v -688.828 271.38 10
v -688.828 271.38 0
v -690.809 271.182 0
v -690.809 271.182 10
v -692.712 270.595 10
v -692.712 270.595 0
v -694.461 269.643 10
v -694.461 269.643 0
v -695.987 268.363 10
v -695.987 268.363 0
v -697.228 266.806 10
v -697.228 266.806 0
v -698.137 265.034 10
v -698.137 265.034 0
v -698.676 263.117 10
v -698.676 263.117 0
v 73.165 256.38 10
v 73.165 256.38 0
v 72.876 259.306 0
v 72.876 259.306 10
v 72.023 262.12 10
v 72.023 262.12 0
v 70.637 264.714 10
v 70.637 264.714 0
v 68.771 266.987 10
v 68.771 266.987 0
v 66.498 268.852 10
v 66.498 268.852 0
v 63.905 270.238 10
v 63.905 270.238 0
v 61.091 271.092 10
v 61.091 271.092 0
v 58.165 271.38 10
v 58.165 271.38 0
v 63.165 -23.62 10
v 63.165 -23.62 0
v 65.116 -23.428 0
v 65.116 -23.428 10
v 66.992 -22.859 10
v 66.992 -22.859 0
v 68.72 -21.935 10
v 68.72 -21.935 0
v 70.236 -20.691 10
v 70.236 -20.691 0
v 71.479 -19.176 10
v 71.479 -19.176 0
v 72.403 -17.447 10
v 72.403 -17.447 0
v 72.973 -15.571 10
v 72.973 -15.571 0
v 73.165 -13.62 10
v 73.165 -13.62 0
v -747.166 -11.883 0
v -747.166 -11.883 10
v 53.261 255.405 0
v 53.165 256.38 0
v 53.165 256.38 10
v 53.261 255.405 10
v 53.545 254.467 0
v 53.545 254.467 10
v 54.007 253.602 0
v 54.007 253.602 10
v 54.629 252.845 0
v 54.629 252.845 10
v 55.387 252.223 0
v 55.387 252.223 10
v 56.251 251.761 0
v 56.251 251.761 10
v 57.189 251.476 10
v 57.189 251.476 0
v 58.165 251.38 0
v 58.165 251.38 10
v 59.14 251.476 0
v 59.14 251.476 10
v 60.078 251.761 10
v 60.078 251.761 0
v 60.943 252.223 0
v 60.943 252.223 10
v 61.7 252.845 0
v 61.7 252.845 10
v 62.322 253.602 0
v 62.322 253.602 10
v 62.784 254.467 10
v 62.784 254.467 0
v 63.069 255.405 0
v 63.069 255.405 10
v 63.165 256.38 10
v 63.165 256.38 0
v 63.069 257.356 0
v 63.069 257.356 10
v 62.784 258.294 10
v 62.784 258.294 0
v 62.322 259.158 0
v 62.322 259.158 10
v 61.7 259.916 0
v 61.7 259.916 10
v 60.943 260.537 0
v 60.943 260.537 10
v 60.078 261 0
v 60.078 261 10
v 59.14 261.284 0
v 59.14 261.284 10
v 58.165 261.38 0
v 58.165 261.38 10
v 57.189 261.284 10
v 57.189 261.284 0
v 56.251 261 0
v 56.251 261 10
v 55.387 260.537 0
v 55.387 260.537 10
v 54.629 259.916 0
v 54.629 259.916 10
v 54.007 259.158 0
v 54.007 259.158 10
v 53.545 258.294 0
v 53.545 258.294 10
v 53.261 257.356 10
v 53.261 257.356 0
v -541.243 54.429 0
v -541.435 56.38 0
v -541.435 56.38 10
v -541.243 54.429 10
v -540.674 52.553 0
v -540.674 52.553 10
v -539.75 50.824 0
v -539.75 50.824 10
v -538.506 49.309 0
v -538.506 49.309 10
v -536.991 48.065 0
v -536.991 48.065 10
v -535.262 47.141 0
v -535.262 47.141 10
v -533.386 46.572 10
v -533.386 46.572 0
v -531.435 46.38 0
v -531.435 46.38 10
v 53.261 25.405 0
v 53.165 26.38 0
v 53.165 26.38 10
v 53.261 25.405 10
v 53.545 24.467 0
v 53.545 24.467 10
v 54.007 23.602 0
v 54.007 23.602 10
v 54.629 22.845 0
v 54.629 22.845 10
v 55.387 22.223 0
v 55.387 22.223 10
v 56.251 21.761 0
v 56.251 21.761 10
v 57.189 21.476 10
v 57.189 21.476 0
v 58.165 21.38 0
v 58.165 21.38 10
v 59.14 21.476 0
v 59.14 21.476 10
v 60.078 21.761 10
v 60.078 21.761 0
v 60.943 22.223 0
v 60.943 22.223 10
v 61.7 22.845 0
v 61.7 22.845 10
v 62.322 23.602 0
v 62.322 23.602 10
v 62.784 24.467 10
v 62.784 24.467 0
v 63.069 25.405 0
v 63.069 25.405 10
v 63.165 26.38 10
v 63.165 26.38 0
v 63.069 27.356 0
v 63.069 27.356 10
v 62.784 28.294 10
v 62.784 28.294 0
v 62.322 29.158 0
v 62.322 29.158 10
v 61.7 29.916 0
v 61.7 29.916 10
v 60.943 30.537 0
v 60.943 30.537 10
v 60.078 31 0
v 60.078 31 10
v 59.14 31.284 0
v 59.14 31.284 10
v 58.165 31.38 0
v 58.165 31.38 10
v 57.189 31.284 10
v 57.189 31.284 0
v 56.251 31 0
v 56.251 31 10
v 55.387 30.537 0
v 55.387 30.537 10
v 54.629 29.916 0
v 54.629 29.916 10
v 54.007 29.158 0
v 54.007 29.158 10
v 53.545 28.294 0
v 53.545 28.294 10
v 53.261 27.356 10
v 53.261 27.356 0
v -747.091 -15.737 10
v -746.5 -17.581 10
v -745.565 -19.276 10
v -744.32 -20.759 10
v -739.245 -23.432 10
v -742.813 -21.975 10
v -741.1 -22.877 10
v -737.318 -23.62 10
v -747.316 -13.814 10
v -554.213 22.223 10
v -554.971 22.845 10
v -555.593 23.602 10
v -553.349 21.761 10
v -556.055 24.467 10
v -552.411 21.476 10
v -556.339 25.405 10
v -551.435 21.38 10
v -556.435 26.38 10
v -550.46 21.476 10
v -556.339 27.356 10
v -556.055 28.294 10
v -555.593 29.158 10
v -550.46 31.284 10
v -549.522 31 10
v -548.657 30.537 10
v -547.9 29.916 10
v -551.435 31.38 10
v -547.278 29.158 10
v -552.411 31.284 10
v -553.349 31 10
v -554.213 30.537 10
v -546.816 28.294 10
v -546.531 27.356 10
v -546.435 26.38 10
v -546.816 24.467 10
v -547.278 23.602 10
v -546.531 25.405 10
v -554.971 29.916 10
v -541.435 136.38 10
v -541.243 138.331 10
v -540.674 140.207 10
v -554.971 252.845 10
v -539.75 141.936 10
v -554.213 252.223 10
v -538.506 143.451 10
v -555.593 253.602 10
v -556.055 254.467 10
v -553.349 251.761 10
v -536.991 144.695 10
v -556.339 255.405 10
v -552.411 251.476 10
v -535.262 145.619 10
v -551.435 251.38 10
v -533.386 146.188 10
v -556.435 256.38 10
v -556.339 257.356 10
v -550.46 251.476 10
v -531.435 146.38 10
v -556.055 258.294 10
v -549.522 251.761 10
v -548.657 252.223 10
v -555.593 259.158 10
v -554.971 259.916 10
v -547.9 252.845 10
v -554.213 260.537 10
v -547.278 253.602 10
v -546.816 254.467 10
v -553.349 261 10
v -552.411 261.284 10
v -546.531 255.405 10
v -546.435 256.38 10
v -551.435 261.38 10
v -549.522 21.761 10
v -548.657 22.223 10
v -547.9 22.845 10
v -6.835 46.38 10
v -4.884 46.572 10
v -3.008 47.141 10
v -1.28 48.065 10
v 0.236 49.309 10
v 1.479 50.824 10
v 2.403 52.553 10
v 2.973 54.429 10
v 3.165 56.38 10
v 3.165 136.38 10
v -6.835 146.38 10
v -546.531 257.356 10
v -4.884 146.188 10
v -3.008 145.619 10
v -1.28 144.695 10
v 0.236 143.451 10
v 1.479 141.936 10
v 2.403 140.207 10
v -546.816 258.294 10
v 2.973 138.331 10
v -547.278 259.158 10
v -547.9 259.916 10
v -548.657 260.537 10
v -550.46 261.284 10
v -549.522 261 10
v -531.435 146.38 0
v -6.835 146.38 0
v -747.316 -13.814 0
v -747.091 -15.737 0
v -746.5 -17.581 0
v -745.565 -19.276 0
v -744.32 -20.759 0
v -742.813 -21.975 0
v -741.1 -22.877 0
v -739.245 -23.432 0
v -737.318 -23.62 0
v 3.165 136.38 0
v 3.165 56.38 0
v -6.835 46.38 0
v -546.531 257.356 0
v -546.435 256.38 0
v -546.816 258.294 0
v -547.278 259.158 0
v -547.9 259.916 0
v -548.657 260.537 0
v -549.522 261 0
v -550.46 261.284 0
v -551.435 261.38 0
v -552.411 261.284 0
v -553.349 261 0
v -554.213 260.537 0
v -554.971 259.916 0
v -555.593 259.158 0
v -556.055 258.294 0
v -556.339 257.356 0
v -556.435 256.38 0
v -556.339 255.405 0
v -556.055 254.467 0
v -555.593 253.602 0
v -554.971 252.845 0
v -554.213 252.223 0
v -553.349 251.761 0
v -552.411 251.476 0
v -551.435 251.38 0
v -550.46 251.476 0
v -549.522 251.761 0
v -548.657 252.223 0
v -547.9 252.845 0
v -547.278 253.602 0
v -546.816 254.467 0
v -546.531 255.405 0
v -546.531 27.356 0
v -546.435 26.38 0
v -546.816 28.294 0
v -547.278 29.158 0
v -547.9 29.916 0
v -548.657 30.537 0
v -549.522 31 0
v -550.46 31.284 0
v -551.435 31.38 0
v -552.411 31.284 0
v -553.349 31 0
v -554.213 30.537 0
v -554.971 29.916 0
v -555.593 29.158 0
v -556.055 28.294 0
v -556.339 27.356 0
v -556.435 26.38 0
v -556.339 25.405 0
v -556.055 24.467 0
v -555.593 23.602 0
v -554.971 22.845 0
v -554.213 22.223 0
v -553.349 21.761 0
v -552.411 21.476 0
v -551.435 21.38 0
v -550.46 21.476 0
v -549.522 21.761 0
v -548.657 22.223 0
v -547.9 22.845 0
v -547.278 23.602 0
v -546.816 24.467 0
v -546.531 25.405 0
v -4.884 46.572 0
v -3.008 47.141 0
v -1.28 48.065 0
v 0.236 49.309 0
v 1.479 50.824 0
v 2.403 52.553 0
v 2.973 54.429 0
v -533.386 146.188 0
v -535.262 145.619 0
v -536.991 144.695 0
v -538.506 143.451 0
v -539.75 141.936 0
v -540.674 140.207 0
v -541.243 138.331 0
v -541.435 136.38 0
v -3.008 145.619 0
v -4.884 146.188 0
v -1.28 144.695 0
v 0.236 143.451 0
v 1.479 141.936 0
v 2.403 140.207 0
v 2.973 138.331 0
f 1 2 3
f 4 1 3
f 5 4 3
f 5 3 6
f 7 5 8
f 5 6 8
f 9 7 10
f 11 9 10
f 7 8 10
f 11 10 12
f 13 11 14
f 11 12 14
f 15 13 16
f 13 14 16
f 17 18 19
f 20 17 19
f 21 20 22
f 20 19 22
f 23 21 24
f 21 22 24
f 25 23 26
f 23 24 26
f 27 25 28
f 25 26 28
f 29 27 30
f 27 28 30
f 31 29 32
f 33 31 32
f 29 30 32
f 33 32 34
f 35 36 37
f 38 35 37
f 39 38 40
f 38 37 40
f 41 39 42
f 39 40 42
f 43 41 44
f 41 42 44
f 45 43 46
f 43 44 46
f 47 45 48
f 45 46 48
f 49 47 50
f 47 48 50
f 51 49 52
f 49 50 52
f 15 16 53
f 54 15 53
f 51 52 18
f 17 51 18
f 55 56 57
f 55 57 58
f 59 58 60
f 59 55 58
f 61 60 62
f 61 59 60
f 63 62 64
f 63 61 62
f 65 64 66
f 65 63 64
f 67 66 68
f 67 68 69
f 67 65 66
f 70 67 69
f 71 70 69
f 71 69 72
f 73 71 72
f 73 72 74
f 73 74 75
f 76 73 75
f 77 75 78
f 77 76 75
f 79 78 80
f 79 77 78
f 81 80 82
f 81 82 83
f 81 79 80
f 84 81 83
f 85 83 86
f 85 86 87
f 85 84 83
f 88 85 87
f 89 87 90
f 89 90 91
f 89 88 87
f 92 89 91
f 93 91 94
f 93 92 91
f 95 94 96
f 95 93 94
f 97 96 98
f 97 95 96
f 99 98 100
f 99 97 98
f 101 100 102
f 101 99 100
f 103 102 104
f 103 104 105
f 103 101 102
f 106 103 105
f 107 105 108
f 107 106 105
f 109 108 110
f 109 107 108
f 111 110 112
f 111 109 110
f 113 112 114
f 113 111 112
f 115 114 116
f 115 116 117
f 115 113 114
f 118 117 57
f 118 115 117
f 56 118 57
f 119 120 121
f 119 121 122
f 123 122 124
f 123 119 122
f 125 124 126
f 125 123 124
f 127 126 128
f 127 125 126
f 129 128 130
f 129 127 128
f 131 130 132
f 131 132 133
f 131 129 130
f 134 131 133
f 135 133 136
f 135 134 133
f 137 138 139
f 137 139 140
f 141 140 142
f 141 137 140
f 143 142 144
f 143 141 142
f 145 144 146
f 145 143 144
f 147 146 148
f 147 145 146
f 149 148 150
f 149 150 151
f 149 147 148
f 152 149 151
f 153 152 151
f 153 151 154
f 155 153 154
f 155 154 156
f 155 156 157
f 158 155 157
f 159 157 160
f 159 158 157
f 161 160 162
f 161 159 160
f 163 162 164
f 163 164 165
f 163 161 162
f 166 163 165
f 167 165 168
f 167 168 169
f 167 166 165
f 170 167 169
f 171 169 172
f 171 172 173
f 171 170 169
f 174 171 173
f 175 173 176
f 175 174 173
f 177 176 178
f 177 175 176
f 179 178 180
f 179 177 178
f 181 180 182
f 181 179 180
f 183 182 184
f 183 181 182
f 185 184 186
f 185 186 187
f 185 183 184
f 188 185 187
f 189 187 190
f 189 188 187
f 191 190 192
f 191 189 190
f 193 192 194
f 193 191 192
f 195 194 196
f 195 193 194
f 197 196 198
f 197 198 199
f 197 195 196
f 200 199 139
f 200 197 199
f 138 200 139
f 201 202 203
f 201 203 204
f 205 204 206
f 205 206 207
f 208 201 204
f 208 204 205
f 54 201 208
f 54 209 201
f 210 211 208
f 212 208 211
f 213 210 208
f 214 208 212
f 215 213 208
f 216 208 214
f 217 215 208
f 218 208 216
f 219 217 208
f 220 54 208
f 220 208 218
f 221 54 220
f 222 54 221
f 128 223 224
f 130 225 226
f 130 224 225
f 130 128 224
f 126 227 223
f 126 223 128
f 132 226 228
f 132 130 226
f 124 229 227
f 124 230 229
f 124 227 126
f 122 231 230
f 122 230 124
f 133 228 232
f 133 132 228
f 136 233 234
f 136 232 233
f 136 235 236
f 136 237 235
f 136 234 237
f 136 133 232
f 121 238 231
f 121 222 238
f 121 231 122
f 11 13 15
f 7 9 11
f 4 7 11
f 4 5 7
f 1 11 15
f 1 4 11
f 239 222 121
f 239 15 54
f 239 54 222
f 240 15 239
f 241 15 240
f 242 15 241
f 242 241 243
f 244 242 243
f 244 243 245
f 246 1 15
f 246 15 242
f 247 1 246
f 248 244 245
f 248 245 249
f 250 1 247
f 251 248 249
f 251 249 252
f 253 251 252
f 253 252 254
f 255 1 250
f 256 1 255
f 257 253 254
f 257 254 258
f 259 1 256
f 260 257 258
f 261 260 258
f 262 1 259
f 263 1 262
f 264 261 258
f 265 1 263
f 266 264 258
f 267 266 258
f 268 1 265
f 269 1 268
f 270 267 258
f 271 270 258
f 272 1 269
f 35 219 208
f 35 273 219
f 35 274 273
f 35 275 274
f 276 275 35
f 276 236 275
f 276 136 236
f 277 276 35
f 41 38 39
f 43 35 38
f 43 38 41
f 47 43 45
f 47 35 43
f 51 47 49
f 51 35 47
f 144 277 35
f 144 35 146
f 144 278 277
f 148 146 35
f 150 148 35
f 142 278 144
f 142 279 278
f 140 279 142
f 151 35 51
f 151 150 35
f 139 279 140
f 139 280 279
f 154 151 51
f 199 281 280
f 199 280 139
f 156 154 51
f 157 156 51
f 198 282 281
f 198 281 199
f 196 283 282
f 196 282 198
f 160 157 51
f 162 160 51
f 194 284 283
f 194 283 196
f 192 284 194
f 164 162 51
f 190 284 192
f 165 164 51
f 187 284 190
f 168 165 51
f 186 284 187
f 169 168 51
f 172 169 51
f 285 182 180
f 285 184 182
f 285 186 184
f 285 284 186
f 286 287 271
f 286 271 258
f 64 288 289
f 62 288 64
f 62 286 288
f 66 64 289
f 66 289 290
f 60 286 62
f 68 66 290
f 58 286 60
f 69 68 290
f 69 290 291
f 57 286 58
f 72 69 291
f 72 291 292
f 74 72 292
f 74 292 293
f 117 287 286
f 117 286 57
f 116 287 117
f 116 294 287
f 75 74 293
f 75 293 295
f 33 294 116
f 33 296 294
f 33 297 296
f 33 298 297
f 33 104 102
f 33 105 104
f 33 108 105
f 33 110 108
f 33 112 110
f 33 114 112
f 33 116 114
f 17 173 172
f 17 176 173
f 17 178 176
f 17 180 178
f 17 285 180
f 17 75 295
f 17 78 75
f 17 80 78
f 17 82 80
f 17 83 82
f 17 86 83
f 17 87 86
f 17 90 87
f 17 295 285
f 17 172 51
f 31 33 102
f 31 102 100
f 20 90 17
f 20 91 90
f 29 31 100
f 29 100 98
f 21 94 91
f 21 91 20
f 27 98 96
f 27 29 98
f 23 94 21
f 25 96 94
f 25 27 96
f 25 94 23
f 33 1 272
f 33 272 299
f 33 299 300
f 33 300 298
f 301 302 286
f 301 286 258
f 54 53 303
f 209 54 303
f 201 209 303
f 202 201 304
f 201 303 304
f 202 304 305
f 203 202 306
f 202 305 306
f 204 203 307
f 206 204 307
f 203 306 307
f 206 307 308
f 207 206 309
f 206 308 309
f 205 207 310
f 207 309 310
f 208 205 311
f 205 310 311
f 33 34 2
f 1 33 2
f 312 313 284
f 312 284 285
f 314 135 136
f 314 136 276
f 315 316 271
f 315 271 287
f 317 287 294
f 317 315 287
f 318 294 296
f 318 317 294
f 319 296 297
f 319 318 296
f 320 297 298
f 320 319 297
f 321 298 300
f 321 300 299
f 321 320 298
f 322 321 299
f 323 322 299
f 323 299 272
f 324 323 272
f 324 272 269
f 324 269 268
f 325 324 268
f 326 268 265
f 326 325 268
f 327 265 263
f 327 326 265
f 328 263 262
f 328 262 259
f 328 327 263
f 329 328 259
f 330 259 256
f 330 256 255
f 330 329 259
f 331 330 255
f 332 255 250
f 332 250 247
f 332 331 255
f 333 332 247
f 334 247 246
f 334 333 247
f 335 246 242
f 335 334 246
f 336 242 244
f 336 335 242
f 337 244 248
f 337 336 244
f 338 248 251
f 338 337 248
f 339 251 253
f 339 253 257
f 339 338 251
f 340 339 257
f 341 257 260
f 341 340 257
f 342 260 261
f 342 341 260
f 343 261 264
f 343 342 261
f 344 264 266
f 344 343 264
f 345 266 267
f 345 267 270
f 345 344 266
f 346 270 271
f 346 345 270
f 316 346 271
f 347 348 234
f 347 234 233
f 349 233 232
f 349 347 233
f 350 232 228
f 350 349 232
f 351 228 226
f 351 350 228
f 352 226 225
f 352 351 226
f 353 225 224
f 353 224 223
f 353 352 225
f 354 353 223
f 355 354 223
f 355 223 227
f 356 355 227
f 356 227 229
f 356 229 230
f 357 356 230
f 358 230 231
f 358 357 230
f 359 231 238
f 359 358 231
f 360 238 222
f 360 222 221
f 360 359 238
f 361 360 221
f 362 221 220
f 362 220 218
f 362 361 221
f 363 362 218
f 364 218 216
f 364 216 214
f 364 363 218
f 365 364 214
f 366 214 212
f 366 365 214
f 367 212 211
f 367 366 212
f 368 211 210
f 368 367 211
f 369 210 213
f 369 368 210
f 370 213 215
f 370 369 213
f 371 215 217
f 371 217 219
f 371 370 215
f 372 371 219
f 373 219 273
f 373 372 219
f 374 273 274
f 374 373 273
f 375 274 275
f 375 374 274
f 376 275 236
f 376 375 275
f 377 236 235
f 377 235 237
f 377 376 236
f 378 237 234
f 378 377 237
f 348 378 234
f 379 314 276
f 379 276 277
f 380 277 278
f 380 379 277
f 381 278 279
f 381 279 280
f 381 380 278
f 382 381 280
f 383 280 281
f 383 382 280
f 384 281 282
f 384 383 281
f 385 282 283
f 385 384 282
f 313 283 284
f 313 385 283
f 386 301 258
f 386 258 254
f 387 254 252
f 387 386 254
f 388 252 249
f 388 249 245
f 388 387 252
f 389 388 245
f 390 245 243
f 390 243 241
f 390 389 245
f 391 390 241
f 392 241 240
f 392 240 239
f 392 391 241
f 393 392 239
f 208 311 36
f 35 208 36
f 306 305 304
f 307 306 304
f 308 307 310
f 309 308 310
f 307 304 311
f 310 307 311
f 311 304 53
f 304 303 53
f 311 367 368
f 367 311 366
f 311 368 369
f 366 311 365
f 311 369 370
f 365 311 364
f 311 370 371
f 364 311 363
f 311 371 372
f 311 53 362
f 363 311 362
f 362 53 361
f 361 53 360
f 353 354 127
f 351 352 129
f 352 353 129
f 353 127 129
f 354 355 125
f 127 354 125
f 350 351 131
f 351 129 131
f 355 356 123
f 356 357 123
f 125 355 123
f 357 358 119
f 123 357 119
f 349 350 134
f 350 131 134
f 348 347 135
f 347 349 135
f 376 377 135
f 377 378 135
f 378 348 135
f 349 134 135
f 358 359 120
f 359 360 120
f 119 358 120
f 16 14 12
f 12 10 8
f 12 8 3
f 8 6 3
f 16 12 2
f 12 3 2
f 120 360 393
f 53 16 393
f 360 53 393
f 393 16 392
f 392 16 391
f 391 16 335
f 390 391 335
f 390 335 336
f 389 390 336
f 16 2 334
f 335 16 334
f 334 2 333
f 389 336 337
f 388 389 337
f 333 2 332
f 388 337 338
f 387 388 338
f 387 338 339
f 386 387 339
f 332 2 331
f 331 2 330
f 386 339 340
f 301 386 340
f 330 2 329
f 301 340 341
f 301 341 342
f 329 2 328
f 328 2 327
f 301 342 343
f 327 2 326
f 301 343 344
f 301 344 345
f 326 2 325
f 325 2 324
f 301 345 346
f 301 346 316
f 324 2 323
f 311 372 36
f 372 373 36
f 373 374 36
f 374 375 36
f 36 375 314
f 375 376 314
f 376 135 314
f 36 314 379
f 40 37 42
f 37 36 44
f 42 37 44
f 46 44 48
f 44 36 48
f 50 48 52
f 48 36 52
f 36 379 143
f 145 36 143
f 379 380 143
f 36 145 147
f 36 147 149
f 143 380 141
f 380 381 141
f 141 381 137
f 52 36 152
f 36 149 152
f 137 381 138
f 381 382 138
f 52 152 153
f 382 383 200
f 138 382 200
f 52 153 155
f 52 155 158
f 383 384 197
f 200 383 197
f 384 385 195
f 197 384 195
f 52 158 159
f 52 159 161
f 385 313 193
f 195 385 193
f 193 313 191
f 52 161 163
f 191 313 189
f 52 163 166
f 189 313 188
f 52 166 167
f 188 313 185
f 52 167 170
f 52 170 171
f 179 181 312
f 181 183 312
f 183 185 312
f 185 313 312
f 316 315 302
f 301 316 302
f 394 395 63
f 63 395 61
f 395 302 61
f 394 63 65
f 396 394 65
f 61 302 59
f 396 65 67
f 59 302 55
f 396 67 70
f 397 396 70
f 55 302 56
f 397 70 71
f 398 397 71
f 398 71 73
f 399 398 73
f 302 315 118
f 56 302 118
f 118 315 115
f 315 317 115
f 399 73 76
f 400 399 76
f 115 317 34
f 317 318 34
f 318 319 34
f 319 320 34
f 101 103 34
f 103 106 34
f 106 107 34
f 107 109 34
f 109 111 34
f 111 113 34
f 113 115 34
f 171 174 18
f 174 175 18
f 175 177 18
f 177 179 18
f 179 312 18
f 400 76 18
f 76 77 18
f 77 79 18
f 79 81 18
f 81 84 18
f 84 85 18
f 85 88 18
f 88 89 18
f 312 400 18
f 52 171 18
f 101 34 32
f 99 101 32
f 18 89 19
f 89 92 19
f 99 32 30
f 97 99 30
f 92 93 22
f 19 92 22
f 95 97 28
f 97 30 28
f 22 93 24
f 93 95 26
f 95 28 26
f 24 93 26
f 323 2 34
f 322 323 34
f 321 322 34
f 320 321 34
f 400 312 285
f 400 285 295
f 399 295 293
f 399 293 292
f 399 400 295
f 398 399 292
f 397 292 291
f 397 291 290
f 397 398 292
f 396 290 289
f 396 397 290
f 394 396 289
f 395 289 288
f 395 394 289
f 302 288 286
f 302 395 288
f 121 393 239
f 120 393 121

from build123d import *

# Parameters (mm, degrees)
SKETCH2_R           = 5
BOSS_EXTRUDE1_DEPTH = 10


with BuildPart() as part:
    # Sketch2 → Boss-Extrude1 (new body)
    with BuildSketch(Plane.XY):
        with BuildLine():
            Line((-737.317762878, -23.619861577), (63.164701196, -23.619861577))
            ThreePointArc((63.164701196, -23.619861577), (70.235769008, -20.690929389), (73.164701196, -13.619861577))
            Line((73.164701196, -13.619861577), (73.164701196, 256.380138423))
            ThreePointArc((73.164701196, 256.380138423), (68.771302914, 266.986740141), (58.164701196, 271.380138423))
            Line((58.164701196, 271.380138423), (-688.827843183, 271.380138423))
            ThreePointArc((-688.827843183, 271.380138423), (-695.25571928, 269.040582854), (-698.675920713, 263.116620199))
            Line((-698.675920713, 263.116620199), (-747.165840408, -11.883379801))
            ThreePointArc((-747.165840408, -11.883379801), (-744.978207309, -20.047737674), (-737.317762878, -23.619861577))
        make_face()
        with Locations(Location((58.164701196, 256.380138423, 0), (0, 0, 180))):
            Circle(SKETCH2_R, mode=Mode.SUBTRACT)
        with Locations((-551.435298804, 26.380138423)):
            Circle(SKETCH2_R, mode=Mode.SUBTRACT)
        with Locations(Location((58.164701196, 26.380138423, 0), (0, 0, 180))):
            Circle(SKETCH2_R, mode=Mode.SUBTRACT)
        with Locations((-551.435298804, 256.380138423)):
            Circle(SKETCH2_R, mode=Mode.SUBTRACT)
        with BuildLine():
            Line((-531.435298804, 46.380138423), (-6.835298804, 46.380138423))
            ThreePointArc((-6.835298804, 46.380138423), (0.235769008, 49.309070611), (3.164701196, 56.380138423))
            Line((3.164701196, 56.380138423), (3.164701196, 136.380138423))
            ThreePointArc((3.164701196, 136.380138423), (0.235769008, 143.451206235), (-6.835298804, 146.380138423))
            Line((-6.835298804, 146.380138423), (-531.435298804, 146.380138423))
            ThreePointArc((-531.435298804, 146.380138423), (-538.506366616, 143.451206235), (-541.435298804, 136.380138423))
            Line((-541.435298804, 136.380138423), (-541.435298804, 56.380138423))
            ThreePointArc((-541.435298804, 56.380138423), (-538.506366616, 49.309070611), (-531.435298804, 46.380138423))
        make_face(mode=Mode.SUBTRACT)
    extrude(amount=BOSS_EXTRUDE1_DEPTH)


solid = part.part
